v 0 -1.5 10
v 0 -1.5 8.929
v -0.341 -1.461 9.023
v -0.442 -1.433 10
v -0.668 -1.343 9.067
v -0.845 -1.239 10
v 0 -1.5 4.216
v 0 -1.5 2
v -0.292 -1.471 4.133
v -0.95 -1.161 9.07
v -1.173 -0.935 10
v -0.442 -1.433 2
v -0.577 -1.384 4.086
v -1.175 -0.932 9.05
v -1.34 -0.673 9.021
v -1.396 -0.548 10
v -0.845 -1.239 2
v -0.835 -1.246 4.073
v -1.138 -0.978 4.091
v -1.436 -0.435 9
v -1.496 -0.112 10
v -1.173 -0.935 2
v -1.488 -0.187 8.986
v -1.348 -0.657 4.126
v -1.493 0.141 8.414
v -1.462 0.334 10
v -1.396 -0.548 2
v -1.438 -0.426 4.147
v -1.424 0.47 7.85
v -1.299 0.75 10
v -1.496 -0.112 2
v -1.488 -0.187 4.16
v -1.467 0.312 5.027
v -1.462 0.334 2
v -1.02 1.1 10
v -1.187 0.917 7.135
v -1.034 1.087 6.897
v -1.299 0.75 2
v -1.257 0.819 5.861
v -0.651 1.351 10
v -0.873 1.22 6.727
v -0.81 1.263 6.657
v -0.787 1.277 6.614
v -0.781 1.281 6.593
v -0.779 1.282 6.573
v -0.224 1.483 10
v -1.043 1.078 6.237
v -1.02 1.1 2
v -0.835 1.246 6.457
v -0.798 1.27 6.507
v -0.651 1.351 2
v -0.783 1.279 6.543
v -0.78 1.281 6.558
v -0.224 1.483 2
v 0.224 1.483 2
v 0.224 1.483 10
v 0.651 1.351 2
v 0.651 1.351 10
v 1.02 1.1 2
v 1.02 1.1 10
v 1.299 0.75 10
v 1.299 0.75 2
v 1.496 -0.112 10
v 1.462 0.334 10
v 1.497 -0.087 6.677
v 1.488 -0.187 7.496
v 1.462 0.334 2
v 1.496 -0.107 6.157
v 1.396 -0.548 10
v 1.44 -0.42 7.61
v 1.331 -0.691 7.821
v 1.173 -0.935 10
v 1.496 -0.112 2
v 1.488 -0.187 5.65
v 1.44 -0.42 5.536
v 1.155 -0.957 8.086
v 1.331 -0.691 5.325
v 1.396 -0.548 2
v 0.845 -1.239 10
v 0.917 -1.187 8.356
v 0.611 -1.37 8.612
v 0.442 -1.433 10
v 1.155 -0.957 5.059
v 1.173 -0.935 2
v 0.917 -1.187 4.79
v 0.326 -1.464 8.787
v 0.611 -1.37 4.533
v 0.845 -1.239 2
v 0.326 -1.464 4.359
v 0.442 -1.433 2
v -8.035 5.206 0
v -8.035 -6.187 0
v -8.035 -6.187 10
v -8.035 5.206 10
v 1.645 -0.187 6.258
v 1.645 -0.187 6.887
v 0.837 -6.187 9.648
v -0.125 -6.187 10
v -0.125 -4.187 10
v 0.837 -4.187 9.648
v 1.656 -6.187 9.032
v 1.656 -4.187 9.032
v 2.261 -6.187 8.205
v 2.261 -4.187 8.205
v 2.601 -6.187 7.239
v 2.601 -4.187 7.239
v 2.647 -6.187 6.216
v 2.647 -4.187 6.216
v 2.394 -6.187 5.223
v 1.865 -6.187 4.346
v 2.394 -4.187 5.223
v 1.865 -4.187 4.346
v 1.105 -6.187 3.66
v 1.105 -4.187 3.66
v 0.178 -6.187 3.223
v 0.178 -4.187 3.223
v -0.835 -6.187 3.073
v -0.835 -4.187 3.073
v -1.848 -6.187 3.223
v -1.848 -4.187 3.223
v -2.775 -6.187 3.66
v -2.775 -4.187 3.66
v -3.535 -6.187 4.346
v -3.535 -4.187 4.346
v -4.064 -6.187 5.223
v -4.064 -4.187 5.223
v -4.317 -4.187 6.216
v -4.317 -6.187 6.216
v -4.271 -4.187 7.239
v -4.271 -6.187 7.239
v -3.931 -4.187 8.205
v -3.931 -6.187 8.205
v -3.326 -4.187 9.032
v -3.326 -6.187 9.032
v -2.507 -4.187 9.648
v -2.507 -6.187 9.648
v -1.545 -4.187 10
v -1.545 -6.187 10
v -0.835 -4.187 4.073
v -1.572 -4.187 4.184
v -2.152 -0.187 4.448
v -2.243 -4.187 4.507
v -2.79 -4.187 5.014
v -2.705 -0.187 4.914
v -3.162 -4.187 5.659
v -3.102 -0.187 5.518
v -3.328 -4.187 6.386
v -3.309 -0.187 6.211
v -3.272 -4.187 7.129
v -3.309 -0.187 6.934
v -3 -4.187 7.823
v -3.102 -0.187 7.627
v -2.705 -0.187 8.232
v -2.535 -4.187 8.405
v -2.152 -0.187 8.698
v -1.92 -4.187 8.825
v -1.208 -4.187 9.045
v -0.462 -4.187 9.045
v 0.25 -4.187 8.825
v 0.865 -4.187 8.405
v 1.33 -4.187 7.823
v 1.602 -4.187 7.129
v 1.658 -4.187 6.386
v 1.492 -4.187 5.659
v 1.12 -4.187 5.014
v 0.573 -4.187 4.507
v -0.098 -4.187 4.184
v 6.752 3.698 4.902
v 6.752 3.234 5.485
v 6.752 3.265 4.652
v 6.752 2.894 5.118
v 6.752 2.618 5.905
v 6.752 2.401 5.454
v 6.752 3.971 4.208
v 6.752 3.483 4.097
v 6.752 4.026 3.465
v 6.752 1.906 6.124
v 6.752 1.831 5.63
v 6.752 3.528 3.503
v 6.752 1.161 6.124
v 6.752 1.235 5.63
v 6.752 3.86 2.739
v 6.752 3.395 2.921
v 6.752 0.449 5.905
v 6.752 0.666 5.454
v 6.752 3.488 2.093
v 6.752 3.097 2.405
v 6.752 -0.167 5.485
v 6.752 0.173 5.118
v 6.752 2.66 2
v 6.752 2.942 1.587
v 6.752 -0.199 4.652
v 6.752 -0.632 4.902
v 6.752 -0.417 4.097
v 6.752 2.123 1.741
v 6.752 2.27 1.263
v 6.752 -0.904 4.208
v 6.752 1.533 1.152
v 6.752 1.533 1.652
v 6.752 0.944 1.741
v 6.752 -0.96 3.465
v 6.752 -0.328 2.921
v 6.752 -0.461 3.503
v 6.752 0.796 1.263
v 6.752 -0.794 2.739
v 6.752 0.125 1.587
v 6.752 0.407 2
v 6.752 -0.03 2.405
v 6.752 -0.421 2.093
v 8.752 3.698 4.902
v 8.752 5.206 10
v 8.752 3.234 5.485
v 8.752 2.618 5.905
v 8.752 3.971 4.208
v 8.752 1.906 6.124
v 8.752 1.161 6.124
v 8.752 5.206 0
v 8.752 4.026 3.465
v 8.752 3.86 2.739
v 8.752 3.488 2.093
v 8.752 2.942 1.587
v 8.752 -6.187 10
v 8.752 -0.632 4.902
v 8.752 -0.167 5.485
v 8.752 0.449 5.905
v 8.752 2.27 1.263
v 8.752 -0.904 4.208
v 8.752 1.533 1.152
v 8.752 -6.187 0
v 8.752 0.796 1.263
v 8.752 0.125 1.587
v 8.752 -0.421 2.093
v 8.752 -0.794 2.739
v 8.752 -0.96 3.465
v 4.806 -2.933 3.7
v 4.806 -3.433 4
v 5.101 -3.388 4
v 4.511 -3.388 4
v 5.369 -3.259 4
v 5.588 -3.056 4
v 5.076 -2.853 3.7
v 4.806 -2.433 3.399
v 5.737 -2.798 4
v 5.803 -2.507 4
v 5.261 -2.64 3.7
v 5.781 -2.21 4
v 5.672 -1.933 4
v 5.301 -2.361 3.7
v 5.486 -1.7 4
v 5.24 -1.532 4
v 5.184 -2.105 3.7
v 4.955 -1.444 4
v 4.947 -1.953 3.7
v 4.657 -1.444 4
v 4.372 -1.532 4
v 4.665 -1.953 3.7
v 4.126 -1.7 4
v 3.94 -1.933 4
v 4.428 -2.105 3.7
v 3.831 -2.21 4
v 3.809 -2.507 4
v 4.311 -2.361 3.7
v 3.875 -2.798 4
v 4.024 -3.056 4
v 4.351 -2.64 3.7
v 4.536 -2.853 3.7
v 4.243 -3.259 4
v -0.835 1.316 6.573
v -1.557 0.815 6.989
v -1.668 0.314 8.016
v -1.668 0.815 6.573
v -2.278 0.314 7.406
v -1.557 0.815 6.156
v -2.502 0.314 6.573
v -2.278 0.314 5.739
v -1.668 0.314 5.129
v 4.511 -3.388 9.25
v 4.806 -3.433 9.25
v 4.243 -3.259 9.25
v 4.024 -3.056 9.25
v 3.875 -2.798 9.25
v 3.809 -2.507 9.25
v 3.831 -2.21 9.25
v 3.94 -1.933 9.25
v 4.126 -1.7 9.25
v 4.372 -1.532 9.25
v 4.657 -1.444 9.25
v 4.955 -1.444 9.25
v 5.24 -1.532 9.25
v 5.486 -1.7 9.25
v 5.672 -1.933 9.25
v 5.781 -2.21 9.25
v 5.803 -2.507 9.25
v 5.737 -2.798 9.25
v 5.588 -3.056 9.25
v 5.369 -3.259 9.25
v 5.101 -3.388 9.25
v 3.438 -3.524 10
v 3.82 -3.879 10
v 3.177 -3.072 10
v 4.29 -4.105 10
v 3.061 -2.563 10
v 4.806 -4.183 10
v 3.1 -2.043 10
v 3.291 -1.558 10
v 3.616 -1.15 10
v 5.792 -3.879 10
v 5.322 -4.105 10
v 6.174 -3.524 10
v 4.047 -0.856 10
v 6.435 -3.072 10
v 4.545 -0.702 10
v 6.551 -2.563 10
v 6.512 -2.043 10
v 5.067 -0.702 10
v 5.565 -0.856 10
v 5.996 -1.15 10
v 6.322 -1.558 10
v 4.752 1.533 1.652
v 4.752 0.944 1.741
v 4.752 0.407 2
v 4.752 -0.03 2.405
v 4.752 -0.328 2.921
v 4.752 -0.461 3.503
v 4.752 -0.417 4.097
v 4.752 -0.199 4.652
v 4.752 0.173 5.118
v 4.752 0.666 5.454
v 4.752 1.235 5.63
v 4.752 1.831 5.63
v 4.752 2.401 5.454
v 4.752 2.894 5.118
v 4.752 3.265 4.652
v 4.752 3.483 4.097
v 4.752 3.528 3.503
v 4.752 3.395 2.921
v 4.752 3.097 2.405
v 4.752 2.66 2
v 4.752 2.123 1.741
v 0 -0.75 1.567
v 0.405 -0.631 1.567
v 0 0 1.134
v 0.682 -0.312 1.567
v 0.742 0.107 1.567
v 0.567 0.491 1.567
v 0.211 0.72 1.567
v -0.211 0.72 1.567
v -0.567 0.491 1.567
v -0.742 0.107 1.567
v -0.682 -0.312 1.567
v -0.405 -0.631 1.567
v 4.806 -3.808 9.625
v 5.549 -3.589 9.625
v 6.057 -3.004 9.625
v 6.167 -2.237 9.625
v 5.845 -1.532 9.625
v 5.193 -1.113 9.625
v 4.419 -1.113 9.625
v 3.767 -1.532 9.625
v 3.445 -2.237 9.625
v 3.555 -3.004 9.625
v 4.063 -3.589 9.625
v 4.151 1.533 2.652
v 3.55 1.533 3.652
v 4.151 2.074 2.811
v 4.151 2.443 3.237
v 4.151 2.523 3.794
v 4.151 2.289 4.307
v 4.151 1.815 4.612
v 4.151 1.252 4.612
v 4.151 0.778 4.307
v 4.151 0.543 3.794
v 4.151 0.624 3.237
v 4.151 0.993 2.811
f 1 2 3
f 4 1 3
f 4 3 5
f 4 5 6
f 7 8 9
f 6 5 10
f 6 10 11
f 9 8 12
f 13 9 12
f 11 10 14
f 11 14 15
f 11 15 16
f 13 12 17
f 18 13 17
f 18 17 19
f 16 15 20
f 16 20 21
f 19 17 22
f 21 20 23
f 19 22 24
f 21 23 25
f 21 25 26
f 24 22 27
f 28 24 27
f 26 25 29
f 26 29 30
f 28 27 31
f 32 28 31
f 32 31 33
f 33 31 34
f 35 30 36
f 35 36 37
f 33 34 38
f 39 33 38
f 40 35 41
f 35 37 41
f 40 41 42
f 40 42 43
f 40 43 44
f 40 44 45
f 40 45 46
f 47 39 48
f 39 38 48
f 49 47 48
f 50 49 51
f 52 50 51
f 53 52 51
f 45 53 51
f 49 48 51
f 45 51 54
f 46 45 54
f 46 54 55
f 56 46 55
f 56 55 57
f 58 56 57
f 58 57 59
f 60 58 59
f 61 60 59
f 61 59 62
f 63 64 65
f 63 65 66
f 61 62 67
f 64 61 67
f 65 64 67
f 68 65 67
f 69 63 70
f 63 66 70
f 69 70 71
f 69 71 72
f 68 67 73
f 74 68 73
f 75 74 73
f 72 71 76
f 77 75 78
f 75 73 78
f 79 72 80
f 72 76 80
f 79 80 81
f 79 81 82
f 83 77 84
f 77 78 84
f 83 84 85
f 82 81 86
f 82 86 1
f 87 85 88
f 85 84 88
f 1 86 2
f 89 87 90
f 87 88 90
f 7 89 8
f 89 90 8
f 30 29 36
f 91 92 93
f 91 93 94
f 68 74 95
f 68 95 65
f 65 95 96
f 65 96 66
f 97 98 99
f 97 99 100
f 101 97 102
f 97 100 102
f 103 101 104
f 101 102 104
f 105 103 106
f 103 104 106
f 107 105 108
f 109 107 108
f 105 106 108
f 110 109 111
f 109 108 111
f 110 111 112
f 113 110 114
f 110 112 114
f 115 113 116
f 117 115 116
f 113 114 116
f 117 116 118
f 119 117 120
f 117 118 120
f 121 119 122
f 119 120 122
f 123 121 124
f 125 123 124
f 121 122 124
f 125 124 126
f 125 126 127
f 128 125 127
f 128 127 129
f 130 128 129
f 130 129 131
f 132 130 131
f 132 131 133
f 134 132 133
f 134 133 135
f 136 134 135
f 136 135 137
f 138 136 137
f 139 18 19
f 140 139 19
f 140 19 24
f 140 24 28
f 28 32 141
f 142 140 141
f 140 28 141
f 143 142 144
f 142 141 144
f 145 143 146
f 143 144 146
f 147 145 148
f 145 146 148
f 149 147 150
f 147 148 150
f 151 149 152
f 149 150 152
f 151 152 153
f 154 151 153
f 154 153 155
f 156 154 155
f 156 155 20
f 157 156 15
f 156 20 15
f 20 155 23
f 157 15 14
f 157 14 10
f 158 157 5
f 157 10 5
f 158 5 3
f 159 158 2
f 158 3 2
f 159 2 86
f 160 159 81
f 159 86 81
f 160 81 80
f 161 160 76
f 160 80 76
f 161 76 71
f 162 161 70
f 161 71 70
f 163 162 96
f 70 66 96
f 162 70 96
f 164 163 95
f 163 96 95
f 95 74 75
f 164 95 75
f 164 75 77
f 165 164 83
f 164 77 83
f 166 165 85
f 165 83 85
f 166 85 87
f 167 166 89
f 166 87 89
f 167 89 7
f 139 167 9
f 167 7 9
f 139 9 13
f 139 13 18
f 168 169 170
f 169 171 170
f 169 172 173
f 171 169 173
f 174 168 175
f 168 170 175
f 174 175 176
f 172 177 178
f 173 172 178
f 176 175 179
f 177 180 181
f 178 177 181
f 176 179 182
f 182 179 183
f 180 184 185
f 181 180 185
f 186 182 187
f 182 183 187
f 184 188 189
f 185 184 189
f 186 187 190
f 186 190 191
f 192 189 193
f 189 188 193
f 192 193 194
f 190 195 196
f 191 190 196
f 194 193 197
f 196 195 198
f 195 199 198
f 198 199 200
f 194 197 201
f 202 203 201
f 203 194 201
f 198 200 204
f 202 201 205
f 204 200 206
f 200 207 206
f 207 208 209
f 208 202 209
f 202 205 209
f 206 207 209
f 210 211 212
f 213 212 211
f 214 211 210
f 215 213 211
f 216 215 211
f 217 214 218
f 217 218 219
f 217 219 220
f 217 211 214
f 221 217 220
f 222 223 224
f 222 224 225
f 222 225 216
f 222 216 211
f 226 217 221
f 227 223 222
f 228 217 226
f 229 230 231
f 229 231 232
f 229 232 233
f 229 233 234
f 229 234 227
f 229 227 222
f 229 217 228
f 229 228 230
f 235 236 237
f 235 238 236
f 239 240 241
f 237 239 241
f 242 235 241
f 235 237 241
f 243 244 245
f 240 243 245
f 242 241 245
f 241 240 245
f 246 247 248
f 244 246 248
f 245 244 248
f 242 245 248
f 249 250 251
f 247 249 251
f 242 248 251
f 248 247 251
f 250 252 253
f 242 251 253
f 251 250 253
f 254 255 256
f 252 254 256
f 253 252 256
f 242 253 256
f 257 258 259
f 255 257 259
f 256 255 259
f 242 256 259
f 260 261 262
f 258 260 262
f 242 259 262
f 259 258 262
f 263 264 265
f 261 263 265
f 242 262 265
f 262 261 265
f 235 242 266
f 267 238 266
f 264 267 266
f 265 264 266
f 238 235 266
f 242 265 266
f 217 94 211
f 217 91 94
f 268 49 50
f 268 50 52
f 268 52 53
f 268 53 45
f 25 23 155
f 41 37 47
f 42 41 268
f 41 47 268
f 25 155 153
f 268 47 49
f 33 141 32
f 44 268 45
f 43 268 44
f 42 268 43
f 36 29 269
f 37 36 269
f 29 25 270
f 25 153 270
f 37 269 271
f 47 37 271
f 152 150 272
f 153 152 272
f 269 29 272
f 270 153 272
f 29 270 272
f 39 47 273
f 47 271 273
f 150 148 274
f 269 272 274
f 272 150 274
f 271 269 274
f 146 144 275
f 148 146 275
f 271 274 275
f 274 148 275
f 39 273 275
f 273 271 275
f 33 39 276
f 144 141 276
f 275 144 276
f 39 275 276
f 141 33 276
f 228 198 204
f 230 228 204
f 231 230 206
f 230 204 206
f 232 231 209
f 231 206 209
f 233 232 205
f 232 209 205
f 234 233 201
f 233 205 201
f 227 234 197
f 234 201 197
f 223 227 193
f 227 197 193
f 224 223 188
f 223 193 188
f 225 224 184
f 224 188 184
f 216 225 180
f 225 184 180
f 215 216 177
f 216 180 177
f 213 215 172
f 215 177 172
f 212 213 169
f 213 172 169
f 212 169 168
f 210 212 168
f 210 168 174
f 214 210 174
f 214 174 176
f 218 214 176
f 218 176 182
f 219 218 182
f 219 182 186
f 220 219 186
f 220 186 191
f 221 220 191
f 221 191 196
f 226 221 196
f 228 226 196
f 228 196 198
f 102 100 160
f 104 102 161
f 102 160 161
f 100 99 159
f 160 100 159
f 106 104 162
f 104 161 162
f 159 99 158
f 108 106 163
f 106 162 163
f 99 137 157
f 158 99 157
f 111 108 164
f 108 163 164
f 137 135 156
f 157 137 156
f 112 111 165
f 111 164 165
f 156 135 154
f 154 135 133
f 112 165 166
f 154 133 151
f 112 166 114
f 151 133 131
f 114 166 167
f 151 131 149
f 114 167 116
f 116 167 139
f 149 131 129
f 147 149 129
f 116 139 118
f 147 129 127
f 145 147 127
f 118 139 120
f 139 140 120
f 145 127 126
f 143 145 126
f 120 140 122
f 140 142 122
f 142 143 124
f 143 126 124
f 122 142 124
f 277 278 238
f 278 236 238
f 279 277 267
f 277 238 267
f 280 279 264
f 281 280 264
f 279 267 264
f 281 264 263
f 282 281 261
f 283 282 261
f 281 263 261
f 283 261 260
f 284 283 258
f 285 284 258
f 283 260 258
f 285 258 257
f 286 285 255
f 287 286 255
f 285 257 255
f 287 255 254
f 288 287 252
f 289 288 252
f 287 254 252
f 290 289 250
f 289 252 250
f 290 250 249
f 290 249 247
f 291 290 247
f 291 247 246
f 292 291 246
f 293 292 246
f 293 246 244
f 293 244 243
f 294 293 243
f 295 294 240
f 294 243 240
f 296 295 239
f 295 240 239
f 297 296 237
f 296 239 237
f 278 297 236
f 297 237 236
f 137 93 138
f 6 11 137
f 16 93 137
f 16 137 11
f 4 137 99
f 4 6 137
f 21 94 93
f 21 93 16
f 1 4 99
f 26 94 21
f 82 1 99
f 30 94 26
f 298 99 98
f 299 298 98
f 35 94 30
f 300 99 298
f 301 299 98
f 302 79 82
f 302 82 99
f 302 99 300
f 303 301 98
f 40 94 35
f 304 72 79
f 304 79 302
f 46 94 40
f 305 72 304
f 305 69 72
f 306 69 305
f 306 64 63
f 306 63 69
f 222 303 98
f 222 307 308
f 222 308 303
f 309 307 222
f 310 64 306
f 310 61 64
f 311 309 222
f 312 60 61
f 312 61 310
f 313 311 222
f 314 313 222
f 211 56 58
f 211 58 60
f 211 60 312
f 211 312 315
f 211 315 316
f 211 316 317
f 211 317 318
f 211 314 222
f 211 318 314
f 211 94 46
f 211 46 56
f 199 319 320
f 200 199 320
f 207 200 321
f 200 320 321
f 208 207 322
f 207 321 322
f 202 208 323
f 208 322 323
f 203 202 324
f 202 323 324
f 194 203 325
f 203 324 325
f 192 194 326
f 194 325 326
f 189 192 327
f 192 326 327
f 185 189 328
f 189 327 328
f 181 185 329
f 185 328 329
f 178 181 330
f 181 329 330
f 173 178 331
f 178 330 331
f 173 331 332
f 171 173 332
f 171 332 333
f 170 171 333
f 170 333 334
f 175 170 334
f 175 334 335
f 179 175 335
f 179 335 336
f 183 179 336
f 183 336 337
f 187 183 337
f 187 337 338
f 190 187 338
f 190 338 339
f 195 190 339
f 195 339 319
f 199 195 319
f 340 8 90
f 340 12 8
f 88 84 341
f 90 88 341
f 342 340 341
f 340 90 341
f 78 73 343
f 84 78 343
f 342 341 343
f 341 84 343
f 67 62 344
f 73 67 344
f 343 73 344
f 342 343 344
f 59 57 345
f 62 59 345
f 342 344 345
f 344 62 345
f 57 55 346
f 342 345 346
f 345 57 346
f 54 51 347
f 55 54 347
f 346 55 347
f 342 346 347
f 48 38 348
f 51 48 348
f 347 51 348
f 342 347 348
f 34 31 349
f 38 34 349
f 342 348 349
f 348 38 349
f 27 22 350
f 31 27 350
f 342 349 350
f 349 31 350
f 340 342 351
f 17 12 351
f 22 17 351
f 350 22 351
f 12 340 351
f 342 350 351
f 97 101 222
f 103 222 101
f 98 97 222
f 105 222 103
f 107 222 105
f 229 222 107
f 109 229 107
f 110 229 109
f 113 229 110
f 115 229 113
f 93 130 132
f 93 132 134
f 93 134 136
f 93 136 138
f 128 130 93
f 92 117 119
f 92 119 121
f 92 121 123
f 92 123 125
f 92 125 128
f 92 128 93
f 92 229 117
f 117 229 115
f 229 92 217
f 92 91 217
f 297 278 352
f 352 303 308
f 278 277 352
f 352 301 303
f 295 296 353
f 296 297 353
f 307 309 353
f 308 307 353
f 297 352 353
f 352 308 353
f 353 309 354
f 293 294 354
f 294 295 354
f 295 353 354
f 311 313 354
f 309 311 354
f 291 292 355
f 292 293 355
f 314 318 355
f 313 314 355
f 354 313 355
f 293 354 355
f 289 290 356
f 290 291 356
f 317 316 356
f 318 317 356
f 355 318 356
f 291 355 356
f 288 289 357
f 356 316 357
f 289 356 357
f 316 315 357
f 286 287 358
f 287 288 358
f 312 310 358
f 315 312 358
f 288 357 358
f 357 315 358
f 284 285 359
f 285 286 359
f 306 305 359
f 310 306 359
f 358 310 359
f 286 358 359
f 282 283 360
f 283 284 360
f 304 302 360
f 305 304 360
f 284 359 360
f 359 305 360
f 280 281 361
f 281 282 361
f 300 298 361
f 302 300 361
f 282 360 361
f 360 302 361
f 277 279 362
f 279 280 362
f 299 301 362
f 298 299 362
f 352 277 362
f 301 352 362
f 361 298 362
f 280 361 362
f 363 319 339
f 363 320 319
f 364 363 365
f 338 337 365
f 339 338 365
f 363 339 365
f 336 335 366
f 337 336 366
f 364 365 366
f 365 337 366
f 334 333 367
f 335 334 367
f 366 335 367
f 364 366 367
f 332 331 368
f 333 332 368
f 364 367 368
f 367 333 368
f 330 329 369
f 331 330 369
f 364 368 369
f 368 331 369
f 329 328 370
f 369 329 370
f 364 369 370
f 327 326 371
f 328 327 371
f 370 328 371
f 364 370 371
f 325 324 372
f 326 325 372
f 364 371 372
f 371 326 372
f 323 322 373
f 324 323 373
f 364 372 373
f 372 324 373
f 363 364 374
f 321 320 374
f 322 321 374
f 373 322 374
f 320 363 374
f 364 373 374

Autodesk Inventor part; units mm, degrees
ref_plane "YZ Plane" through (0, 0, 0) normal (1, 0, 0) x (0, 1, 0)
ref_plane "XZ Plane" through (0, 0, 0) normal (0, 1, 0) x (-1, 0, 0)
ref_plane "XY Plane" through (0, 0, 0) normal (0, 0, 1) x (1, 0, 0)
sketch "Skizze1" plane through (0, 0, 0) normal (0, 0, 1) x (1, 0, 0)
  line L0 (-8.0351, 5.2058) -> (8.7518, 5.2058)
  line L1 (8.7518, 5.2058) -> (8.7518, -6.1866)
  line L2 (8.7518, -6.1866) -> (-8.0351, -6.1866)
  line L3 (-8.0351, -6.1866) -> (-8.0351, 5.2058)
  point P0 (0, 0)
extrude "Extrusion1" add sketch "Skizze1" along normal blind 10
sketch "Skizze2" plane through (0, 0, 10) normal (0, 0, 1) x (1, 0, 0)
  point P0 (0, 0)
hole "Drill01" at (0, 0, 10) direction (0, 0, -1) diameter 3 depth 8 tip angle 120
hole "Drill02" at (8.7518, 1.5333, 3.6521) direction (-1, 0, 0) diameter 4 depth 4 tip angle 118 counterbore diameter 5 counterbore depth 2
hole "Drill03" at (-0.835, -6.1866, 6.5728) direction (0, 1, 0) diameter 5 depth 6 tip angle 118 counterbore diameter 7 counterbore depth 2
hole "Drill04" at (4.8061, -2.4326, 10) direction (0, 0, -1) diameter 2 depth 6 tip angle 118 countersink diameter 3.5 countersink angle 90
properties part number "FxDrill_02"
